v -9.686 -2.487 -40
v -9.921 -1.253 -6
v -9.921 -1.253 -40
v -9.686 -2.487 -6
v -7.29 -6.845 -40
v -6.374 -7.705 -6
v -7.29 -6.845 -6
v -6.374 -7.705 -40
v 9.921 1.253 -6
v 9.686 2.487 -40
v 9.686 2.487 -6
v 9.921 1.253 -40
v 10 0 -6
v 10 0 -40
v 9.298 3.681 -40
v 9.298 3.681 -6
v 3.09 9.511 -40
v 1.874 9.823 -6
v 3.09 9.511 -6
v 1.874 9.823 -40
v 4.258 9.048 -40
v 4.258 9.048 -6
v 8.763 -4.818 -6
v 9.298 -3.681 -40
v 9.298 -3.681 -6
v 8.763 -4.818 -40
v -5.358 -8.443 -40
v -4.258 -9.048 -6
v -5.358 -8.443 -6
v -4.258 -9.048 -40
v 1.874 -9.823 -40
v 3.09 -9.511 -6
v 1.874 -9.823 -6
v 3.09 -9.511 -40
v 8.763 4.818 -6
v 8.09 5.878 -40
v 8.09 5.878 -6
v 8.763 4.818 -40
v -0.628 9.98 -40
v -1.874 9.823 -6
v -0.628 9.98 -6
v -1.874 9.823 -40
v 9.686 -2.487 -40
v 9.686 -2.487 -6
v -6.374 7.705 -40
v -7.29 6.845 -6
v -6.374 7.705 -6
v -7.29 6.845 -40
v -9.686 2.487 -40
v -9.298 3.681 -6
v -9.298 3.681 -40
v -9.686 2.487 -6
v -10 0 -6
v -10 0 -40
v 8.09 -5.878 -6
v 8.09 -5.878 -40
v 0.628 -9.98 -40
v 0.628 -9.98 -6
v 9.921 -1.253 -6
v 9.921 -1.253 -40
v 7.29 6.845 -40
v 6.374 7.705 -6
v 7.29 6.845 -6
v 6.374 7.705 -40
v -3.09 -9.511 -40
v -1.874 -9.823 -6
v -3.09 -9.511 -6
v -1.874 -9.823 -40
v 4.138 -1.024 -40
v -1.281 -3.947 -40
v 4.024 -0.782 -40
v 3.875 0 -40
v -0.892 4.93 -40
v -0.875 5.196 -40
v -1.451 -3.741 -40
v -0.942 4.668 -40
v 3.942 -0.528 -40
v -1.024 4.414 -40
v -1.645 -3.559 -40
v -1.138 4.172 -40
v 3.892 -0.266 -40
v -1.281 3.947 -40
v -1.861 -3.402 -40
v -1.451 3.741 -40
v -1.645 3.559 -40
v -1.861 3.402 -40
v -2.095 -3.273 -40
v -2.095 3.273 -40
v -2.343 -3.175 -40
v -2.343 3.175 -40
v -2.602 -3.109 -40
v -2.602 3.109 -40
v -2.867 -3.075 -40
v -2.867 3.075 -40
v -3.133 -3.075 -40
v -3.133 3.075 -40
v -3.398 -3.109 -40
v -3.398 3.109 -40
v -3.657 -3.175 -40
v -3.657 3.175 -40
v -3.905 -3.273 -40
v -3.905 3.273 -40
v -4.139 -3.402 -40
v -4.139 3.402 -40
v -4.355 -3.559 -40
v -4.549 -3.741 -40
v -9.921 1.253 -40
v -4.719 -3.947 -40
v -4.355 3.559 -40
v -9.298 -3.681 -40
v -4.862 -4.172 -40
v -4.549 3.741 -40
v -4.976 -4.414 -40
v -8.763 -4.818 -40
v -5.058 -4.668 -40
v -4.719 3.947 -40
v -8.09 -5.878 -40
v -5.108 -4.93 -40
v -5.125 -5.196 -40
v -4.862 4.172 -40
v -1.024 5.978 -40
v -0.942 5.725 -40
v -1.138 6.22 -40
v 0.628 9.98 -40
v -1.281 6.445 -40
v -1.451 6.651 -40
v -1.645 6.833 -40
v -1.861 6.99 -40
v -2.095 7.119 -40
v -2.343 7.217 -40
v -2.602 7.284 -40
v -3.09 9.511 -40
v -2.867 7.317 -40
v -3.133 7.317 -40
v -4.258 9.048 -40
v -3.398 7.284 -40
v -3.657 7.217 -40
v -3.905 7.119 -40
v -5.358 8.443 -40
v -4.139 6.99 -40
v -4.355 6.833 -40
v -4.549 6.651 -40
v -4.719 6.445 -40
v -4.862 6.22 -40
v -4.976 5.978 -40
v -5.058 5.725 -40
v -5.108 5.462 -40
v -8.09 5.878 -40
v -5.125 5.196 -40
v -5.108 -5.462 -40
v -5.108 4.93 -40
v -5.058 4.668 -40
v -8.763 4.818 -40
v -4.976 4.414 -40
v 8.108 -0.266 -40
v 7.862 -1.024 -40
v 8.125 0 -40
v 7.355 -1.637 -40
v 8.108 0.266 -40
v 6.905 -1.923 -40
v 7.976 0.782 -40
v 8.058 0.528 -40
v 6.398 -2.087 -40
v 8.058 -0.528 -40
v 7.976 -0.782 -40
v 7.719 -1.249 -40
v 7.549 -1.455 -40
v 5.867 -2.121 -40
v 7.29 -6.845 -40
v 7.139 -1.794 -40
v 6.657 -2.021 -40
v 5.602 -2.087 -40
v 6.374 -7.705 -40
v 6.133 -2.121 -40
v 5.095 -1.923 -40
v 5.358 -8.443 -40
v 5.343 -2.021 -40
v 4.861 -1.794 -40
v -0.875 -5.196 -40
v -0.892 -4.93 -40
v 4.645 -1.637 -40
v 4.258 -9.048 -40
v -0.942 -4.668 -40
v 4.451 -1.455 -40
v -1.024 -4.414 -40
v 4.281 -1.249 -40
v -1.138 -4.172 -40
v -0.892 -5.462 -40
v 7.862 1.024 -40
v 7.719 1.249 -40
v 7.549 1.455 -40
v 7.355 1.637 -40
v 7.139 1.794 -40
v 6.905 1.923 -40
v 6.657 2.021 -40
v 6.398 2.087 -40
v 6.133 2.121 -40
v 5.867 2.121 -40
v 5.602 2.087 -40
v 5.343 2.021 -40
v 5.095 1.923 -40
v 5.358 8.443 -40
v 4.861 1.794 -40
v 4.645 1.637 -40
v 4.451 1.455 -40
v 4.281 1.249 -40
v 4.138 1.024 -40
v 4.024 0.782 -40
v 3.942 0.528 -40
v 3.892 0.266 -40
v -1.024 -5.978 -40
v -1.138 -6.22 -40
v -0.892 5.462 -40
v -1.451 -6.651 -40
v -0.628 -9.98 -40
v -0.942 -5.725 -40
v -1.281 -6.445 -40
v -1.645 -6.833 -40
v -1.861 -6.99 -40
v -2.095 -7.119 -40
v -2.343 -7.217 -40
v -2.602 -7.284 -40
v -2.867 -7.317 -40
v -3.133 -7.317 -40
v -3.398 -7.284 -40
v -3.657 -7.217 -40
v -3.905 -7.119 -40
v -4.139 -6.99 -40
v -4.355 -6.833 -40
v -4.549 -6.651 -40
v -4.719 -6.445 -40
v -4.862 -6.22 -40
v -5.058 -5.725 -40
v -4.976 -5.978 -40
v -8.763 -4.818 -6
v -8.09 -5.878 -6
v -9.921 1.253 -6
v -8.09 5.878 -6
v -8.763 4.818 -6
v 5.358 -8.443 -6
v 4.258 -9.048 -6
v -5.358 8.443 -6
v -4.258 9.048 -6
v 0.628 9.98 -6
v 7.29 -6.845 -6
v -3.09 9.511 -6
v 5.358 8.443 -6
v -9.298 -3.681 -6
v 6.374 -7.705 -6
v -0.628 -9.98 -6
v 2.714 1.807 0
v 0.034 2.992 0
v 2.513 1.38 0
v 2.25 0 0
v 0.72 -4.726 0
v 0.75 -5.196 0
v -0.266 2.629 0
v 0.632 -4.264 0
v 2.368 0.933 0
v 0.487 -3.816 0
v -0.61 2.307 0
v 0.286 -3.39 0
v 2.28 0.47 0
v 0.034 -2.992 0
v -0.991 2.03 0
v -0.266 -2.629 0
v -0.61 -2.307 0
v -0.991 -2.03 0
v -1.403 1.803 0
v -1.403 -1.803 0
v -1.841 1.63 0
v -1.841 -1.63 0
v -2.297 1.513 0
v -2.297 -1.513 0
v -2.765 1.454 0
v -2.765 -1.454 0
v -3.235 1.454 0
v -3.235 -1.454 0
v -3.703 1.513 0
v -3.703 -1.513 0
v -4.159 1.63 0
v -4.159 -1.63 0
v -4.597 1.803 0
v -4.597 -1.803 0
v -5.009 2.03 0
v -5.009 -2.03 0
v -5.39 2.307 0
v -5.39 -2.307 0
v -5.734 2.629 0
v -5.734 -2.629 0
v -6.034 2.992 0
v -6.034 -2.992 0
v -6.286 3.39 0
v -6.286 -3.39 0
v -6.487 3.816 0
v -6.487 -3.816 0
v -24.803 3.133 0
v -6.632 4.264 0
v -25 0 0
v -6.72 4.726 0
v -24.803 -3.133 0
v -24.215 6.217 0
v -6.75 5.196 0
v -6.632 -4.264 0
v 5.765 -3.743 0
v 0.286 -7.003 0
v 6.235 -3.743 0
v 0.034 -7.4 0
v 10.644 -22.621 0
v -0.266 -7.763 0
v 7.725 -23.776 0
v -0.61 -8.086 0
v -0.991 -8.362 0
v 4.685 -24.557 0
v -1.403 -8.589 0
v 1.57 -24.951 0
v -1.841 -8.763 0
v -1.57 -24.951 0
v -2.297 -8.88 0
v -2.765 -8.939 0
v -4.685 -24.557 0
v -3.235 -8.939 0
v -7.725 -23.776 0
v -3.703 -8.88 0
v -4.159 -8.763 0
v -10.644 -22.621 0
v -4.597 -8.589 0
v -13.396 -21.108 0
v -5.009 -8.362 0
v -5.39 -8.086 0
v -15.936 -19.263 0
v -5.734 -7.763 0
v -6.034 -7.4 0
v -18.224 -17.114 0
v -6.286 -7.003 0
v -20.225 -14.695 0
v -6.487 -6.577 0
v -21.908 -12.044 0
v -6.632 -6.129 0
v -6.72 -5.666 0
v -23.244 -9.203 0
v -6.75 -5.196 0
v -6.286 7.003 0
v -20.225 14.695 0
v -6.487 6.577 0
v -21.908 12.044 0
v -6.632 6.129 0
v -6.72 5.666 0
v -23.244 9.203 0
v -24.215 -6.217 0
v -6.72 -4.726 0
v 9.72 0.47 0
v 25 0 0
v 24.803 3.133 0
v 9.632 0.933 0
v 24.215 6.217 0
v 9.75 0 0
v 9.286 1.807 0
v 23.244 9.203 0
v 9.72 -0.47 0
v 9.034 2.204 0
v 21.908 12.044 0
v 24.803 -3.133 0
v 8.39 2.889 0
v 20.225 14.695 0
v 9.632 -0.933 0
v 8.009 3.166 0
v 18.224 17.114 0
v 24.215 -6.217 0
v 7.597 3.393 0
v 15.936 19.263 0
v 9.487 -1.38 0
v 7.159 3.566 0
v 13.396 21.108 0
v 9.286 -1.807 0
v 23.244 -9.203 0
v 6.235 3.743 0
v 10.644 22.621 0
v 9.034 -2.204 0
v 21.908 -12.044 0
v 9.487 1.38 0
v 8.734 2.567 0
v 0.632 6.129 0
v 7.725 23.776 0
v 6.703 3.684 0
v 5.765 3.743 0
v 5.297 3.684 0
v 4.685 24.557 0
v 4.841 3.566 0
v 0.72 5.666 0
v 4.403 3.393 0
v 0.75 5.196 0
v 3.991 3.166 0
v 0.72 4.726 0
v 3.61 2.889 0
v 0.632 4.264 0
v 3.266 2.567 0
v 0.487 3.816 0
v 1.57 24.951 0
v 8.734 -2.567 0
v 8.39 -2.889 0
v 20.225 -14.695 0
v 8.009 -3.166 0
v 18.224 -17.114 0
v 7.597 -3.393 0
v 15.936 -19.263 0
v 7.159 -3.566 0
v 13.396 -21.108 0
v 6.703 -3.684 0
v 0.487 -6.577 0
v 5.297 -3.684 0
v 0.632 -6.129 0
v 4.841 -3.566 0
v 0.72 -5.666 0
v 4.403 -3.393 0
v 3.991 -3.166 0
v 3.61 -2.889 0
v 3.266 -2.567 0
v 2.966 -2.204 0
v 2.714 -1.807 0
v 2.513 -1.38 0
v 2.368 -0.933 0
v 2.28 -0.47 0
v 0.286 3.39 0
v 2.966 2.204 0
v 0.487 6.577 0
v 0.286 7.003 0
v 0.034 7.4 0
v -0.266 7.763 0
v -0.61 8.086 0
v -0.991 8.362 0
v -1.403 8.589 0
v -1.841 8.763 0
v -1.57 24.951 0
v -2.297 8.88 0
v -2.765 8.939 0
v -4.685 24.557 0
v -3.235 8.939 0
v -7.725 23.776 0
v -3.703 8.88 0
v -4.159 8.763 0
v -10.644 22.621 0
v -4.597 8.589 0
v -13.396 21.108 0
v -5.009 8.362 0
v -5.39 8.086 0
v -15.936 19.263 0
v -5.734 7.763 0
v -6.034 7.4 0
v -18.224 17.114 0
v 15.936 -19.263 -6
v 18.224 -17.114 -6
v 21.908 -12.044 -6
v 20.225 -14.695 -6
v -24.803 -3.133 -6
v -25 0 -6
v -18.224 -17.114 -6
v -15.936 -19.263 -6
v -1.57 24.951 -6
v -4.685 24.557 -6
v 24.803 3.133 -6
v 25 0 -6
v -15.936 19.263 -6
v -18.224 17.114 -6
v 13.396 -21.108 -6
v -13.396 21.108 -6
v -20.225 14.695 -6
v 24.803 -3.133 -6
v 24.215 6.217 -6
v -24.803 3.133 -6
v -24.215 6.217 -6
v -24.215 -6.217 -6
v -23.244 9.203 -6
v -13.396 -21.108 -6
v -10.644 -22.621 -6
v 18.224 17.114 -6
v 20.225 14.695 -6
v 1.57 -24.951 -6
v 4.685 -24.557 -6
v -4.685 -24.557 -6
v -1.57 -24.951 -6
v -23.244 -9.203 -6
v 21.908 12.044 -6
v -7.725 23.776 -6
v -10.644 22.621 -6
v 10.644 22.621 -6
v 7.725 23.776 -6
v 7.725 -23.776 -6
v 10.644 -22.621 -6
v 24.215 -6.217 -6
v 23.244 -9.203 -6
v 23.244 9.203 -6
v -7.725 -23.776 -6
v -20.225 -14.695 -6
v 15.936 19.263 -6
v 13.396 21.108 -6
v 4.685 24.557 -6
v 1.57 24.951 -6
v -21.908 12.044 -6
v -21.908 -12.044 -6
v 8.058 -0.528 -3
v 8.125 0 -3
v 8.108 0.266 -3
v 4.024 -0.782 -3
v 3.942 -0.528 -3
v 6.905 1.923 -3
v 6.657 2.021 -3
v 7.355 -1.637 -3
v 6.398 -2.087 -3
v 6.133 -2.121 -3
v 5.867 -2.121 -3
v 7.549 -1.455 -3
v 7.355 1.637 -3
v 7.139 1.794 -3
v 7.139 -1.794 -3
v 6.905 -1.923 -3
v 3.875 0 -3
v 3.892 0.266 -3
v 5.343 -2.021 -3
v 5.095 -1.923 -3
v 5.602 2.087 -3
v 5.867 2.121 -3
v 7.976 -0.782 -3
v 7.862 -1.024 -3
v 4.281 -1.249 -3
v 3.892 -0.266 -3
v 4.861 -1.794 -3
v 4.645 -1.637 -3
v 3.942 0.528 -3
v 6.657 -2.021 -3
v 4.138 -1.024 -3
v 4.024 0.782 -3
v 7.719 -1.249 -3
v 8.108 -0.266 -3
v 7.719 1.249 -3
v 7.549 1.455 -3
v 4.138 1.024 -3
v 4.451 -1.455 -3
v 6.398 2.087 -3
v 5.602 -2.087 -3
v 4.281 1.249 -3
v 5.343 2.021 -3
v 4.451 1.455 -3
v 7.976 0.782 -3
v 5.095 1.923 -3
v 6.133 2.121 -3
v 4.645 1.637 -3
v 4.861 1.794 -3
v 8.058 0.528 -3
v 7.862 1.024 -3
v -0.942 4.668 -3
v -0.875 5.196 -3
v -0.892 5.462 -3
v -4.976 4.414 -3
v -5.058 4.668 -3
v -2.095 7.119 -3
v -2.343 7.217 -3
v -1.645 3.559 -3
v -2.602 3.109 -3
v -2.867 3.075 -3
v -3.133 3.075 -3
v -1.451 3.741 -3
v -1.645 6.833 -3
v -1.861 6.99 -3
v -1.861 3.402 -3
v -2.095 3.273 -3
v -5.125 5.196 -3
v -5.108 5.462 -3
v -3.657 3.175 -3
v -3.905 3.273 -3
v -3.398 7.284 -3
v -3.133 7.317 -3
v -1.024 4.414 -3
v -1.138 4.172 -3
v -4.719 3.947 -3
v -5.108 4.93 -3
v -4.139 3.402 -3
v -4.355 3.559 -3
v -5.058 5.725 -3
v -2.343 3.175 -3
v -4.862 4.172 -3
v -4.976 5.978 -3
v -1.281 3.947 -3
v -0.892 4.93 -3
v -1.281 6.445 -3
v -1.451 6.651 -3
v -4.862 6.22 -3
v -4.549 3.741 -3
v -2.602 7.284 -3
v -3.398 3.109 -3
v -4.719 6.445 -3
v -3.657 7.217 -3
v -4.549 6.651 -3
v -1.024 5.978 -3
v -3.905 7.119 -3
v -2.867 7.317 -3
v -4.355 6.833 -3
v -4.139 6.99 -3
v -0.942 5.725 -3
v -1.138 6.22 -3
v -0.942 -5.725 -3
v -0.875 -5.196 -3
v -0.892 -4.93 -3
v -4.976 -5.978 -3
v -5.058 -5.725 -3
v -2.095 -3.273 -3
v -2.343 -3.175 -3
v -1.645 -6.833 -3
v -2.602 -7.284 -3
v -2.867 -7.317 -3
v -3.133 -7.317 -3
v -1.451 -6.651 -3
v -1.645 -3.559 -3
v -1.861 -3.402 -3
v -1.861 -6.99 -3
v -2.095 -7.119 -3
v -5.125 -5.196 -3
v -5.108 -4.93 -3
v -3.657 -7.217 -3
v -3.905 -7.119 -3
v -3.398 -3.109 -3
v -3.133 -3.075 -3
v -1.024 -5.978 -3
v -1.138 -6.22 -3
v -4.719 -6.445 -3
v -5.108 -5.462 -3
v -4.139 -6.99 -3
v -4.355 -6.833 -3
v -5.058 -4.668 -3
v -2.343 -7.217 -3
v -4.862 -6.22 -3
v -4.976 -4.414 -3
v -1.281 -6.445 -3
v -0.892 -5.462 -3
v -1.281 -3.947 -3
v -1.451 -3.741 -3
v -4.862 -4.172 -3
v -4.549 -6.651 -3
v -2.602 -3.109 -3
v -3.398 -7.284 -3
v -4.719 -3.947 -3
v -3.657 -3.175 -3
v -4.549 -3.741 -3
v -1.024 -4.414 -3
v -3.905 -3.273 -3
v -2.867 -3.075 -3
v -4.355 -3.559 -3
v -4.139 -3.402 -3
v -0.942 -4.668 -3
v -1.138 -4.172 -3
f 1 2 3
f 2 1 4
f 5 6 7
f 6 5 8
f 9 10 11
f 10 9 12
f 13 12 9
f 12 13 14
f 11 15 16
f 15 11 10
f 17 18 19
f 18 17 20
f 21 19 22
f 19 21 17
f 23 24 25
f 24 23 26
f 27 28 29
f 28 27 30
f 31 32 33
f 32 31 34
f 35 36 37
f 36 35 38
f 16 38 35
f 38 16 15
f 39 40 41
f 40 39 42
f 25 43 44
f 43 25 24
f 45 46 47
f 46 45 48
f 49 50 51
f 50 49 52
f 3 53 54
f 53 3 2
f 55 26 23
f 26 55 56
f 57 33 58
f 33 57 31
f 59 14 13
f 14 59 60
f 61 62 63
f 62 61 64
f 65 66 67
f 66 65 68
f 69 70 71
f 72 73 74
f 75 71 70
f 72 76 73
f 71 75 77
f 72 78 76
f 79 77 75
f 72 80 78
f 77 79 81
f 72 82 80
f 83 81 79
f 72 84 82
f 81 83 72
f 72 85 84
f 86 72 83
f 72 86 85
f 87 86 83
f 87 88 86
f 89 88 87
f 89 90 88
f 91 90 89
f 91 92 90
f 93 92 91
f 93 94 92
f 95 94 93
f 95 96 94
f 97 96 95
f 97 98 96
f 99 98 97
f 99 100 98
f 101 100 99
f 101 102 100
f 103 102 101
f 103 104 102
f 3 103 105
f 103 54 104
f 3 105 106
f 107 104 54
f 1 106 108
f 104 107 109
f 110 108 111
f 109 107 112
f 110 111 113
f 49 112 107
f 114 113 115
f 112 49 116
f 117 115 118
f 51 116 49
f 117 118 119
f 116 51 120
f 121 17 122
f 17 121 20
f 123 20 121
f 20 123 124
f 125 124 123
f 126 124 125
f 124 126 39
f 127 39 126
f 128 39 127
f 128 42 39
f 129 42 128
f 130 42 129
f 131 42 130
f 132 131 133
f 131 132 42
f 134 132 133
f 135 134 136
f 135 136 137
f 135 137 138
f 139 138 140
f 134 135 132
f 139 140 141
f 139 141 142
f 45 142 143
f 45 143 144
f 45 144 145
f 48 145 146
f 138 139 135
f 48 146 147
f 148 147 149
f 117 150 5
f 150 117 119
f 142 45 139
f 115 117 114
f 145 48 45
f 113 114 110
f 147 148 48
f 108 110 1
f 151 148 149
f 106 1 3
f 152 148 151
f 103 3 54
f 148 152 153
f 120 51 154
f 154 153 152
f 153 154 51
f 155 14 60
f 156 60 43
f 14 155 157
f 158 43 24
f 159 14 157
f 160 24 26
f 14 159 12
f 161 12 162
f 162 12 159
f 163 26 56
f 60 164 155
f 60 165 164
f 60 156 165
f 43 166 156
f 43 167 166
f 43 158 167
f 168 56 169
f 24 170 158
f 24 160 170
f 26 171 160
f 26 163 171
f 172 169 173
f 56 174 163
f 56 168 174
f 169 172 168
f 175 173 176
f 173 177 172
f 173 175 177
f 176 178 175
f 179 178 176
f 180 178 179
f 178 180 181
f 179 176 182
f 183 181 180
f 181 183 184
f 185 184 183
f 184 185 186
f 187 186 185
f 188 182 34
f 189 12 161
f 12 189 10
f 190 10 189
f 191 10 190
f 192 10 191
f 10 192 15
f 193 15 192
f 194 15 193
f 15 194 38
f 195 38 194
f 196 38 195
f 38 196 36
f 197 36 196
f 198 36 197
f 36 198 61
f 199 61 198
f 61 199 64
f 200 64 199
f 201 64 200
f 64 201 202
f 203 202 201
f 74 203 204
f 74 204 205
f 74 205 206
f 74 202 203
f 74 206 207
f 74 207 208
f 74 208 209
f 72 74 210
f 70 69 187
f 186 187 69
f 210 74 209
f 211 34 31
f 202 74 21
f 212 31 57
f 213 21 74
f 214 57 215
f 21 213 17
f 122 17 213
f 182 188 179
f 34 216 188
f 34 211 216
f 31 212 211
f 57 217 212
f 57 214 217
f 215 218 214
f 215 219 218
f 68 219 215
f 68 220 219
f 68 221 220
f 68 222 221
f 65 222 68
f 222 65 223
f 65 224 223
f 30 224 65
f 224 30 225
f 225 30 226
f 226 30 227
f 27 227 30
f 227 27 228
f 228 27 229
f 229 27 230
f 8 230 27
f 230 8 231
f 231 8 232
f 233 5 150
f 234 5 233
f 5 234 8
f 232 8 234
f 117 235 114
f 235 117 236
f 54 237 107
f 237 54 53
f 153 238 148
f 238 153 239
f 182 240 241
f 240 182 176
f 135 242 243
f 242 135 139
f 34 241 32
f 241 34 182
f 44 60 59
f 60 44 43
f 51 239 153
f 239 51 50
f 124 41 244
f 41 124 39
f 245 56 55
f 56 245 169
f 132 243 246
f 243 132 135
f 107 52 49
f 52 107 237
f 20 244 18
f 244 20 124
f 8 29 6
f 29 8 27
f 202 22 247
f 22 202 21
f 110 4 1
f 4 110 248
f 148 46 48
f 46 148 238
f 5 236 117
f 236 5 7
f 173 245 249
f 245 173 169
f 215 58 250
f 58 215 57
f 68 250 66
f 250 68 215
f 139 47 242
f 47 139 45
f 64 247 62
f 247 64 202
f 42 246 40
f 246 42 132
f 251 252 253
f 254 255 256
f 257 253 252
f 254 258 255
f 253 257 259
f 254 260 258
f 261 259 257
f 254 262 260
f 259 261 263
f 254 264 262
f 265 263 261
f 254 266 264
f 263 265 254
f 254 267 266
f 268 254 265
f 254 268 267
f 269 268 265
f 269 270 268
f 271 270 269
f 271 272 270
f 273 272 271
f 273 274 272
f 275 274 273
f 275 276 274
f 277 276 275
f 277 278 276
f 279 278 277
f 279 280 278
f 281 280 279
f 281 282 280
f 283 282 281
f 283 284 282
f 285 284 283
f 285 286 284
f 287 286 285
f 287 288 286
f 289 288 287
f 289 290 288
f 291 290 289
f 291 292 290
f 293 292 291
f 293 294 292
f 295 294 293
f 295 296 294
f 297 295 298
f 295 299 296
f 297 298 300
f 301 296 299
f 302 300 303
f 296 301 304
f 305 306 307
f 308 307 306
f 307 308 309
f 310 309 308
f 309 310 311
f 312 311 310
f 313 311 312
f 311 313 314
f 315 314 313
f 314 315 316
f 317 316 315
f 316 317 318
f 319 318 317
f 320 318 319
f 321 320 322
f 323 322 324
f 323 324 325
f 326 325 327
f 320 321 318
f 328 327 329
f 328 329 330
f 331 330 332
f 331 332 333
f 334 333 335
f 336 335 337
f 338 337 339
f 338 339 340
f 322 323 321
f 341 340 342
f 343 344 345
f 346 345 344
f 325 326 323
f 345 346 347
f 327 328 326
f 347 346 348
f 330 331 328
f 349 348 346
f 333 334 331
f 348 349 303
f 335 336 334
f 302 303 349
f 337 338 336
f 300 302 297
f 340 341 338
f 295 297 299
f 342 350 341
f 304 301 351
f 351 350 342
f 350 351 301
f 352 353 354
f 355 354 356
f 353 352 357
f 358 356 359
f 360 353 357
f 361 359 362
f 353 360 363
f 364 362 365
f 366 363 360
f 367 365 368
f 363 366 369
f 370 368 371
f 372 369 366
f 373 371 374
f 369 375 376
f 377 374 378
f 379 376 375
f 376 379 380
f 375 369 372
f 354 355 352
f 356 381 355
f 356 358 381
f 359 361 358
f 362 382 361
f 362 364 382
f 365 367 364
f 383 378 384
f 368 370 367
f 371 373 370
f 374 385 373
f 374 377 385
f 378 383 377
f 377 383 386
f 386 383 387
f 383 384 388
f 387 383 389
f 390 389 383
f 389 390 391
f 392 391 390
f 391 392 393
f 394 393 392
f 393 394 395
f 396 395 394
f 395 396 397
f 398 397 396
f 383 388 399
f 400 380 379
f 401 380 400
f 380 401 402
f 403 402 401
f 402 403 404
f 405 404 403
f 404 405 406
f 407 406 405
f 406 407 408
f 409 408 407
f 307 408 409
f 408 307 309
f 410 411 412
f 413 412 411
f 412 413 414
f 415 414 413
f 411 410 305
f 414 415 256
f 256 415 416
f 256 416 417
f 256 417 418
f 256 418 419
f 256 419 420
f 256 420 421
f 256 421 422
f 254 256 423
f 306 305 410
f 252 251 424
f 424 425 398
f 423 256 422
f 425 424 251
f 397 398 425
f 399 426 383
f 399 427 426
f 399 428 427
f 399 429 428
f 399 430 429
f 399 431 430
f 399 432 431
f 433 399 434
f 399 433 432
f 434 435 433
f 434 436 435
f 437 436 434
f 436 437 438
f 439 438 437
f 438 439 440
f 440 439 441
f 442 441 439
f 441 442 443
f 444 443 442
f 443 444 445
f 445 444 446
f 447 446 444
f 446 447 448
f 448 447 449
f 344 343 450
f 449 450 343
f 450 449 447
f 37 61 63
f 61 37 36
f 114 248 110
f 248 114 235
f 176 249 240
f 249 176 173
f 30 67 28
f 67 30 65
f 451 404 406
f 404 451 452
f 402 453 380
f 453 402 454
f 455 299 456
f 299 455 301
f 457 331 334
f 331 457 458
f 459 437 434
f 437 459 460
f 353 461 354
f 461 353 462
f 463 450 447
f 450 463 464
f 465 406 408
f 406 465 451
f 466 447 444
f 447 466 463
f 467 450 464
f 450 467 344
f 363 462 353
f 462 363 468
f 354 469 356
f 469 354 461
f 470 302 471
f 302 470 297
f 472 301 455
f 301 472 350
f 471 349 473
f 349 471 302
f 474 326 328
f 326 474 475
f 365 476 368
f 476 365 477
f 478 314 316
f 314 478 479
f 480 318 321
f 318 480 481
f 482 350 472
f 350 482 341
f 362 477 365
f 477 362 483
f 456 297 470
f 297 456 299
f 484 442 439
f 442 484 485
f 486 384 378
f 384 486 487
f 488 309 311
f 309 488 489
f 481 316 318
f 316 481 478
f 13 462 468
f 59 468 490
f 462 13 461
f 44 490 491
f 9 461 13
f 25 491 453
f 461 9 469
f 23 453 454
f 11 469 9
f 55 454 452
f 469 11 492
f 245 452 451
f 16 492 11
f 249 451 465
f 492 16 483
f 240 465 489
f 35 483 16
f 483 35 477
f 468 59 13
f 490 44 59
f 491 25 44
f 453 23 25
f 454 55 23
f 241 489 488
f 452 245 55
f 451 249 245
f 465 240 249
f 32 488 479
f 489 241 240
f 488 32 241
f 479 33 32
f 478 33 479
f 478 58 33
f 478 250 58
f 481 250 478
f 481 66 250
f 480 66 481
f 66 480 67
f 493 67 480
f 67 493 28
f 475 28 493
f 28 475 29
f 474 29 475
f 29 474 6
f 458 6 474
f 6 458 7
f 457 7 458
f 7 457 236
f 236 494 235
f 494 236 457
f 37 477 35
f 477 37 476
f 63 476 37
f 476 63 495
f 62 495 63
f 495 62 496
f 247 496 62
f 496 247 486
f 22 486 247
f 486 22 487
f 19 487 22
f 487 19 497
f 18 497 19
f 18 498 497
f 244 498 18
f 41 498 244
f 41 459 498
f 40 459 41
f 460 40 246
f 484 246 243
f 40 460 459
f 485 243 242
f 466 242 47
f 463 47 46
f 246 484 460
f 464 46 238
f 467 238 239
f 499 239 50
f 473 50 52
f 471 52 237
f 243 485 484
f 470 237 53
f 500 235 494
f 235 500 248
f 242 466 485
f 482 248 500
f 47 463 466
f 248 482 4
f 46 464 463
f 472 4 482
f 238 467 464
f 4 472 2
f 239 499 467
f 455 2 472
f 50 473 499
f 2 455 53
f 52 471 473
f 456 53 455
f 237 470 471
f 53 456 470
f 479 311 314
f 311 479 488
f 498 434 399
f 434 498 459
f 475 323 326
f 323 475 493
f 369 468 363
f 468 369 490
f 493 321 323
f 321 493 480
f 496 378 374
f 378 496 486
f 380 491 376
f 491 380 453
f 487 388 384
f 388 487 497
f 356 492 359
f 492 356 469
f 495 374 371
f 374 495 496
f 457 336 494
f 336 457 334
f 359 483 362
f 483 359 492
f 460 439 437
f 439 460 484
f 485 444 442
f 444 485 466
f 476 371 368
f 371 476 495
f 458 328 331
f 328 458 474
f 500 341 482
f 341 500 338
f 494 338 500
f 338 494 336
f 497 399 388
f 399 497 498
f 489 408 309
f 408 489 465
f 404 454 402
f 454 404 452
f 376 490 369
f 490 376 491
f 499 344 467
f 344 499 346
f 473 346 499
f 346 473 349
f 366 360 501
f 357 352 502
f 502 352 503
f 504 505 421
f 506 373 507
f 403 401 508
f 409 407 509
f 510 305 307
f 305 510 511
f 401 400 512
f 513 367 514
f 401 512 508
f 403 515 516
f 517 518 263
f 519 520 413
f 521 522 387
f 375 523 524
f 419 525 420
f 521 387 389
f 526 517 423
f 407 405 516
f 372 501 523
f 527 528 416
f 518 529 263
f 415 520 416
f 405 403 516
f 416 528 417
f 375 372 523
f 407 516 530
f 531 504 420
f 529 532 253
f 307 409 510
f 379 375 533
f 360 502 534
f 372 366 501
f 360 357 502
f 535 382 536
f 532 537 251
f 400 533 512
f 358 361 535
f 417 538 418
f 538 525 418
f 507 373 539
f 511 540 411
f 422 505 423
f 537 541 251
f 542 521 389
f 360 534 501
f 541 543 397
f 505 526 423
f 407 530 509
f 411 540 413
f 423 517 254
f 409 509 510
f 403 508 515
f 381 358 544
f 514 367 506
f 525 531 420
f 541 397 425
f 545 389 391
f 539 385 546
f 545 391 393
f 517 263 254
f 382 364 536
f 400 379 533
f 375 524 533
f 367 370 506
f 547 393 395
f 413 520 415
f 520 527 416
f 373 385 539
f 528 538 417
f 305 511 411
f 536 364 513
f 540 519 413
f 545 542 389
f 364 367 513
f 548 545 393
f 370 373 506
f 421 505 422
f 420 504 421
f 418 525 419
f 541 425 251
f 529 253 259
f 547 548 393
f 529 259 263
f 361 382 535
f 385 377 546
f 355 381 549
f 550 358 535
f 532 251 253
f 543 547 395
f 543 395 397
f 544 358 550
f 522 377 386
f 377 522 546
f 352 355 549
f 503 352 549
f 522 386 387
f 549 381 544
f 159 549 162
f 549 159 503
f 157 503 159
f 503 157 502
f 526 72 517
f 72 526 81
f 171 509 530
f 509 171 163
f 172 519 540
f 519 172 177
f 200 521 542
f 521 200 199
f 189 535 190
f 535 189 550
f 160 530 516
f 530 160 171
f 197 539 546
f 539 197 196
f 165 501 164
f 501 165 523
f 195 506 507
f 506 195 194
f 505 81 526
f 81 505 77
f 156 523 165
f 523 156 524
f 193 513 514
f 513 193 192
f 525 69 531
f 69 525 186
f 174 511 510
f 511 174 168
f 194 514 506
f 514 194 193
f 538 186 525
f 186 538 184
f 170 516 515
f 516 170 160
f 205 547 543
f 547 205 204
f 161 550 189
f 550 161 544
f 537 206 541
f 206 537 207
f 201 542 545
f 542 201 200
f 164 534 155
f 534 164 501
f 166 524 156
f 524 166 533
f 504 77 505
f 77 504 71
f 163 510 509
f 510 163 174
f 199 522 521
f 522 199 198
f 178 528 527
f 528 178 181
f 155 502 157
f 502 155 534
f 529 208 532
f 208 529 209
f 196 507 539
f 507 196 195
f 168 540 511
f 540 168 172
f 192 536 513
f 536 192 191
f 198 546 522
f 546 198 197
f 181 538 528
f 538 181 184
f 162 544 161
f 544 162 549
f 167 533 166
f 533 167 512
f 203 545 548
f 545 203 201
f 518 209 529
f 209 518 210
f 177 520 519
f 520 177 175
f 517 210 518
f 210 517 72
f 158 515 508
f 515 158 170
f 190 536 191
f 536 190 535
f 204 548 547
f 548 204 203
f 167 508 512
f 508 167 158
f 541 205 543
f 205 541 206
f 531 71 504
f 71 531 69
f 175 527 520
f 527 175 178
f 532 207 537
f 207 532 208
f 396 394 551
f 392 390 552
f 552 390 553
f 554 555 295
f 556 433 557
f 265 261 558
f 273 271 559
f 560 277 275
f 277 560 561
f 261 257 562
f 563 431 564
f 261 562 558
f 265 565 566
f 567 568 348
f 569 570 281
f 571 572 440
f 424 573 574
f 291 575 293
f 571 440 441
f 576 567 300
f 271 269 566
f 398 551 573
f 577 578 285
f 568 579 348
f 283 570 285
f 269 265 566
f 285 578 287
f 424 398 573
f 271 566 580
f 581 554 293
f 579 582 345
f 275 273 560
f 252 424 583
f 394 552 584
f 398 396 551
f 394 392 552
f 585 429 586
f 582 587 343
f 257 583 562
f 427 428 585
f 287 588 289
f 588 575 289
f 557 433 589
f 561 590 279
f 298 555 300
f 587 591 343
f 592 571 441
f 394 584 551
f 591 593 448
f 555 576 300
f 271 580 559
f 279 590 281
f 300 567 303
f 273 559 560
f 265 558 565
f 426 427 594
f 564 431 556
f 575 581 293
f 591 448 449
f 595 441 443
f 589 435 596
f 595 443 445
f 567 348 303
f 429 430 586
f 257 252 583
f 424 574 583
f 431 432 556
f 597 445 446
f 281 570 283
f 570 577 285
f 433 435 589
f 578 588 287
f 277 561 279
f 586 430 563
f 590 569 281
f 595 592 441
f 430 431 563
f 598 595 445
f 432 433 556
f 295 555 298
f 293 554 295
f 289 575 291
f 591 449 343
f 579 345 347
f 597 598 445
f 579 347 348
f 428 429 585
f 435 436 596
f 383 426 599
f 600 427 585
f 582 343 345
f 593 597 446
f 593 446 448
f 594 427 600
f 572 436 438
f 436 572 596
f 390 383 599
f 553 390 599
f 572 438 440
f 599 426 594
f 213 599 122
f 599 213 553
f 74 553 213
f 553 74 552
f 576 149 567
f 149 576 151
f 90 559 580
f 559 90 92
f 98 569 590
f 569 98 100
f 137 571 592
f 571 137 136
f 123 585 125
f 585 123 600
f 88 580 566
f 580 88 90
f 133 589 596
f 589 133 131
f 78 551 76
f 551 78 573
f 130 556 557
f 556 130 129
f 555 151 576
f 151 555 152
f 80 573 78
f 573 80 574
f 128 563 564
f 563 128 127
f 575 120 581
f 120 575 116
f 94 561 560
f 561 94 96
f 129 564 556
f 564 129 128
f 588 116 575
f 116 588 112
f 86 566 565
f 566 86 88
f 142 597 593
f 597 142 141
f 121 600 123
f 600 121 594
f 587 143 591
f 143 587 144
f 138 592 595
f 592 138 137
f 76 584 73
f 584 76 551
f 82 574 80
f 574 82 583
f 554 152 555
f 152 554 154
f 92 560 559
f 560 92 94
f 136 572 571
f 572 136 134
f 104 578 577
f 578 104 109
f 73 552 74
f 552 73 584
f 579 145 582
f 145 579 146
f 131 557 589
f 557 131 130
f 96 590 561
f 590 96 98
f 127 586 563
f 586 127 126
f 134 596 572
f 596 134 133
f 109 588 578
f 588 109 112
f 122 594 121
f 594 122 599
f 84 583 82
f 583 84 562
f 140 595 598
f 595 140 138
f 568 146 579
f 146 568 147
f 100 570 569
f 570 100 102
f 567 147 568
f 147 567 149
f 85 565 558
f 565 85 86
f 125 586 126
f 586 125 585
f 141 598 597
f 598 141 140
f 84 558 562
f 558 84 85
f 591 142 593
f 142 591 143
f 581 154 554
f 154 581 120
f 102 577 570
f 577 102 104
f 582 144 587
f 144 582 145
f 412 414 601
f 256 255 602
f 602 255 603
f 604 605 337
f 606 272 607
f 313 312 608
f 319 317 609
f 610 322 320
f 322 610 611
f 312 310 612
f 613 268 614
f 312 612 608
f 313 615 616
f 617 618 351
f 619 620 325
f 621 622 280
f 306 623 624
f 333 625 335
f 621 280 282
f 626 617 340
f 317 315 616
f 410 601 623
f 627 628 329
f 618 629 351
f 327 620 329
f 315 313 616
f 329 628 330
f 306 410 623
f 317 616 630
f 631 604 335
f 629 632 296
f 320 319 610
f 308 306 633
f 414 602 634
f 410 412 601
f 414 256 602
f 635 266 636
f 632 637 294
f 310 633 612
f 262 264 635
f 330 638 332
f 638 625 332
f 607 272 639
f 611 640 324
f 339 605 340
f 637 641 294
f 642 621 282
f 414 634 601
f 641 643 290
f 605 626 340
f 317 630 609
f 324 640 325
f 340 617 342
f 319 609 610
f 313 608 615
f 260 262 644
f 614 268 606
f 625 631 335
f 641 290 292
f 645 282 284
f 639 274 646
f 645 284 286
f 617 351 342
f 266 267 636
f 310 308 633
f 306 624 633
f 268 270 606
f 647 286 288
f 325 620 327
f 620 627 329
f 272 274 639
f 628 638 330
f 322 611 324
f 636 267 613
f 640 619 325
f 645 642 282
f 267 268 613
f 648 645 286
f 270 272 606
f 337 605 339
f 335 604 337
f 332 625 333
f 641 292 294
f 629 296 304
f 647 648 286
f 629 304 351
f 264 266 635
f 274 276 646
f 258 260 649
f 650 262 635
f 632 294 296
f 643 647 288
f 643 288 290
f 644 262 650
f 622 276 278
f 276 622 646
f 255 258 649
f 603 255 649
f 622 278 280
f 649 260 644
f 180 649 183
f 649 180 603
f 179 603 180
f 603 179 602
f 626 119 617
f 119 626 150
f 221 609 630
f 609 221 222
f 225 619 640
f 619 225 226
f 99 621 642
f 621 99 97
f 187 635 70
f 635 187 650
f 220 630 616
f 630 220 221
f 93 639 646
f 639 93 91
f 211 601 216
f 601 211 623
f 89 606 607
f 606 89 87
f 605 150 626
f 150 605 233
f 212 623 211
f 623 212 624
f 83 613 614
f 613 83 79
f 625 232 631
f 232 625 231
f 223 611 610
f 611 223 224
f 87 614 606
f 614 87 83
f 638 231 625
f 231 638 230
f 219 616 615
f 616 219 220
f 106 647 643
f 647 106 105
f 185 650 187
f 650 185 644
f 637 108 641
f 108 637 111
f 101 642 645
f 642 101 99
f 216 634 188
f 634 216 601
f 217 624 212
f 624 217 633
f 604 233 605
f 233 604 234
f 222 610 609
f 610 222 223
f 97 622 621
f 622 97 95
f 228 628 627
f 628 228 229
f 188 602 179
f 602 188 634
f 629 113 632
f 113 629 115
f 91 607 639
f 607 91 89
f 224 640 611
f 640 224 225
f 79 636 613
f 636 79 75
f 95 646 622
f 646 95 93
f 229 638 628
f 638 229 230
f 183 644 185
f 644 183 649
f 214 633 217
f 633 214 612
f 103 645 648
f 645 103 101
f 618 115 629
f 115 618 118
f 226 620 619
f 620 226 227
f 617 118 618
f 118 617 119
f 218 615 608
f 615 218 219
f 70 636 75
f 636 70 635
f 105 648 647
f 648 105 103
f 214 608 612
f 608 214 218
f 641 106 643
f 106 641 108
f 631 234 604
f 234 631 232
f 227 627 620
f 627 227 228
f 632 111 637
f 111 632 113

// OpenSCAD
$fn = 50;


difference() {
	union() {
		translate(v = [0, 0, -40.0000000000]) {
			cylinder(h = 40, r = 10.0000000000);
		}
		translate(v = [0, 0, -6.0000000000]) {
			cylinder(h = 6, r = 25.0000000000);
		}
	}
	union() {
		translate(v = [6.0000000000, 0.0000000000, 0]) {
			rotate(a = [0, 0, 0]) {
				difference() {
					union() {
						#translate(v = [0, 0, -40.0000000000]) {
							cylinder(h = 40, r = 2.0000000000);
						}
						#translate(v = [0, 0, -3]) {
							cylinder(h = 3, r = 10.0000000000, r1 = 2.1250000000, r2 = 3.7500000000);
						}
						#translate(v = [0, 0, -40.0000000000]) {
							cylinder(h = 40, r = 2.1250000000);
						}
						#translate(v = [0, 0, -40.0000000000]) {
							cylinder(h = 40, r = 2.0000000000);
						}
					}
					union();
				}
			}
		}
		translate(v = [-3.0000000000, 5.1961524227, 0]) {
			rotate(a = [0, 0, 0]) {
				difference() {
					union() {
						#translate(v = [0, 0, -40.0000000000]) {
							cylinder(h = 40, r = 2.0000000000);
						}
						#translate(v = [0, 0, -3]) {
							cylinder(h = 3, r = 10.0000000000, r1 = 2.1250000000, r2 = 3.7500000000);
						}
						#translate(v = [0, 0, -40.0000000000]) {
							cylinder(h = 40, r = 2.1250000000);
						}
						#translate(v = [0, 0, -40.0000000000]) {
							cylinder(h = 40, r = 2.0000000000);
						}
					}
					union();
				}
			}
		}
		translate(v = [-3.0000000000, -5.1961524227, 0]) {
			rotate(a = [0, 0, 0]) {
				difference() {
					union() {
						#translate(v = [0, 0, -40.0000000000]) {
							cylinder(h = 40, r = 2.0000000000);
						}
						#translate(v = [0, 0, -3]) {
							cylinder(h = 3, r = 10.0000000000, r1 = 2.1250000000, r2 = 3.7500000000);
						}
						#translate(v = [0, 0, -40.0000000000]) {
							cylinder(h = 40, r = 2.1250000000);
						}
						#translate(v = [0, 0, -40.0000000000]) {
							cylinder(h = 40, r = 2.0000000000);
						}
					}
					union();
				}
			}
		}
	}
}
